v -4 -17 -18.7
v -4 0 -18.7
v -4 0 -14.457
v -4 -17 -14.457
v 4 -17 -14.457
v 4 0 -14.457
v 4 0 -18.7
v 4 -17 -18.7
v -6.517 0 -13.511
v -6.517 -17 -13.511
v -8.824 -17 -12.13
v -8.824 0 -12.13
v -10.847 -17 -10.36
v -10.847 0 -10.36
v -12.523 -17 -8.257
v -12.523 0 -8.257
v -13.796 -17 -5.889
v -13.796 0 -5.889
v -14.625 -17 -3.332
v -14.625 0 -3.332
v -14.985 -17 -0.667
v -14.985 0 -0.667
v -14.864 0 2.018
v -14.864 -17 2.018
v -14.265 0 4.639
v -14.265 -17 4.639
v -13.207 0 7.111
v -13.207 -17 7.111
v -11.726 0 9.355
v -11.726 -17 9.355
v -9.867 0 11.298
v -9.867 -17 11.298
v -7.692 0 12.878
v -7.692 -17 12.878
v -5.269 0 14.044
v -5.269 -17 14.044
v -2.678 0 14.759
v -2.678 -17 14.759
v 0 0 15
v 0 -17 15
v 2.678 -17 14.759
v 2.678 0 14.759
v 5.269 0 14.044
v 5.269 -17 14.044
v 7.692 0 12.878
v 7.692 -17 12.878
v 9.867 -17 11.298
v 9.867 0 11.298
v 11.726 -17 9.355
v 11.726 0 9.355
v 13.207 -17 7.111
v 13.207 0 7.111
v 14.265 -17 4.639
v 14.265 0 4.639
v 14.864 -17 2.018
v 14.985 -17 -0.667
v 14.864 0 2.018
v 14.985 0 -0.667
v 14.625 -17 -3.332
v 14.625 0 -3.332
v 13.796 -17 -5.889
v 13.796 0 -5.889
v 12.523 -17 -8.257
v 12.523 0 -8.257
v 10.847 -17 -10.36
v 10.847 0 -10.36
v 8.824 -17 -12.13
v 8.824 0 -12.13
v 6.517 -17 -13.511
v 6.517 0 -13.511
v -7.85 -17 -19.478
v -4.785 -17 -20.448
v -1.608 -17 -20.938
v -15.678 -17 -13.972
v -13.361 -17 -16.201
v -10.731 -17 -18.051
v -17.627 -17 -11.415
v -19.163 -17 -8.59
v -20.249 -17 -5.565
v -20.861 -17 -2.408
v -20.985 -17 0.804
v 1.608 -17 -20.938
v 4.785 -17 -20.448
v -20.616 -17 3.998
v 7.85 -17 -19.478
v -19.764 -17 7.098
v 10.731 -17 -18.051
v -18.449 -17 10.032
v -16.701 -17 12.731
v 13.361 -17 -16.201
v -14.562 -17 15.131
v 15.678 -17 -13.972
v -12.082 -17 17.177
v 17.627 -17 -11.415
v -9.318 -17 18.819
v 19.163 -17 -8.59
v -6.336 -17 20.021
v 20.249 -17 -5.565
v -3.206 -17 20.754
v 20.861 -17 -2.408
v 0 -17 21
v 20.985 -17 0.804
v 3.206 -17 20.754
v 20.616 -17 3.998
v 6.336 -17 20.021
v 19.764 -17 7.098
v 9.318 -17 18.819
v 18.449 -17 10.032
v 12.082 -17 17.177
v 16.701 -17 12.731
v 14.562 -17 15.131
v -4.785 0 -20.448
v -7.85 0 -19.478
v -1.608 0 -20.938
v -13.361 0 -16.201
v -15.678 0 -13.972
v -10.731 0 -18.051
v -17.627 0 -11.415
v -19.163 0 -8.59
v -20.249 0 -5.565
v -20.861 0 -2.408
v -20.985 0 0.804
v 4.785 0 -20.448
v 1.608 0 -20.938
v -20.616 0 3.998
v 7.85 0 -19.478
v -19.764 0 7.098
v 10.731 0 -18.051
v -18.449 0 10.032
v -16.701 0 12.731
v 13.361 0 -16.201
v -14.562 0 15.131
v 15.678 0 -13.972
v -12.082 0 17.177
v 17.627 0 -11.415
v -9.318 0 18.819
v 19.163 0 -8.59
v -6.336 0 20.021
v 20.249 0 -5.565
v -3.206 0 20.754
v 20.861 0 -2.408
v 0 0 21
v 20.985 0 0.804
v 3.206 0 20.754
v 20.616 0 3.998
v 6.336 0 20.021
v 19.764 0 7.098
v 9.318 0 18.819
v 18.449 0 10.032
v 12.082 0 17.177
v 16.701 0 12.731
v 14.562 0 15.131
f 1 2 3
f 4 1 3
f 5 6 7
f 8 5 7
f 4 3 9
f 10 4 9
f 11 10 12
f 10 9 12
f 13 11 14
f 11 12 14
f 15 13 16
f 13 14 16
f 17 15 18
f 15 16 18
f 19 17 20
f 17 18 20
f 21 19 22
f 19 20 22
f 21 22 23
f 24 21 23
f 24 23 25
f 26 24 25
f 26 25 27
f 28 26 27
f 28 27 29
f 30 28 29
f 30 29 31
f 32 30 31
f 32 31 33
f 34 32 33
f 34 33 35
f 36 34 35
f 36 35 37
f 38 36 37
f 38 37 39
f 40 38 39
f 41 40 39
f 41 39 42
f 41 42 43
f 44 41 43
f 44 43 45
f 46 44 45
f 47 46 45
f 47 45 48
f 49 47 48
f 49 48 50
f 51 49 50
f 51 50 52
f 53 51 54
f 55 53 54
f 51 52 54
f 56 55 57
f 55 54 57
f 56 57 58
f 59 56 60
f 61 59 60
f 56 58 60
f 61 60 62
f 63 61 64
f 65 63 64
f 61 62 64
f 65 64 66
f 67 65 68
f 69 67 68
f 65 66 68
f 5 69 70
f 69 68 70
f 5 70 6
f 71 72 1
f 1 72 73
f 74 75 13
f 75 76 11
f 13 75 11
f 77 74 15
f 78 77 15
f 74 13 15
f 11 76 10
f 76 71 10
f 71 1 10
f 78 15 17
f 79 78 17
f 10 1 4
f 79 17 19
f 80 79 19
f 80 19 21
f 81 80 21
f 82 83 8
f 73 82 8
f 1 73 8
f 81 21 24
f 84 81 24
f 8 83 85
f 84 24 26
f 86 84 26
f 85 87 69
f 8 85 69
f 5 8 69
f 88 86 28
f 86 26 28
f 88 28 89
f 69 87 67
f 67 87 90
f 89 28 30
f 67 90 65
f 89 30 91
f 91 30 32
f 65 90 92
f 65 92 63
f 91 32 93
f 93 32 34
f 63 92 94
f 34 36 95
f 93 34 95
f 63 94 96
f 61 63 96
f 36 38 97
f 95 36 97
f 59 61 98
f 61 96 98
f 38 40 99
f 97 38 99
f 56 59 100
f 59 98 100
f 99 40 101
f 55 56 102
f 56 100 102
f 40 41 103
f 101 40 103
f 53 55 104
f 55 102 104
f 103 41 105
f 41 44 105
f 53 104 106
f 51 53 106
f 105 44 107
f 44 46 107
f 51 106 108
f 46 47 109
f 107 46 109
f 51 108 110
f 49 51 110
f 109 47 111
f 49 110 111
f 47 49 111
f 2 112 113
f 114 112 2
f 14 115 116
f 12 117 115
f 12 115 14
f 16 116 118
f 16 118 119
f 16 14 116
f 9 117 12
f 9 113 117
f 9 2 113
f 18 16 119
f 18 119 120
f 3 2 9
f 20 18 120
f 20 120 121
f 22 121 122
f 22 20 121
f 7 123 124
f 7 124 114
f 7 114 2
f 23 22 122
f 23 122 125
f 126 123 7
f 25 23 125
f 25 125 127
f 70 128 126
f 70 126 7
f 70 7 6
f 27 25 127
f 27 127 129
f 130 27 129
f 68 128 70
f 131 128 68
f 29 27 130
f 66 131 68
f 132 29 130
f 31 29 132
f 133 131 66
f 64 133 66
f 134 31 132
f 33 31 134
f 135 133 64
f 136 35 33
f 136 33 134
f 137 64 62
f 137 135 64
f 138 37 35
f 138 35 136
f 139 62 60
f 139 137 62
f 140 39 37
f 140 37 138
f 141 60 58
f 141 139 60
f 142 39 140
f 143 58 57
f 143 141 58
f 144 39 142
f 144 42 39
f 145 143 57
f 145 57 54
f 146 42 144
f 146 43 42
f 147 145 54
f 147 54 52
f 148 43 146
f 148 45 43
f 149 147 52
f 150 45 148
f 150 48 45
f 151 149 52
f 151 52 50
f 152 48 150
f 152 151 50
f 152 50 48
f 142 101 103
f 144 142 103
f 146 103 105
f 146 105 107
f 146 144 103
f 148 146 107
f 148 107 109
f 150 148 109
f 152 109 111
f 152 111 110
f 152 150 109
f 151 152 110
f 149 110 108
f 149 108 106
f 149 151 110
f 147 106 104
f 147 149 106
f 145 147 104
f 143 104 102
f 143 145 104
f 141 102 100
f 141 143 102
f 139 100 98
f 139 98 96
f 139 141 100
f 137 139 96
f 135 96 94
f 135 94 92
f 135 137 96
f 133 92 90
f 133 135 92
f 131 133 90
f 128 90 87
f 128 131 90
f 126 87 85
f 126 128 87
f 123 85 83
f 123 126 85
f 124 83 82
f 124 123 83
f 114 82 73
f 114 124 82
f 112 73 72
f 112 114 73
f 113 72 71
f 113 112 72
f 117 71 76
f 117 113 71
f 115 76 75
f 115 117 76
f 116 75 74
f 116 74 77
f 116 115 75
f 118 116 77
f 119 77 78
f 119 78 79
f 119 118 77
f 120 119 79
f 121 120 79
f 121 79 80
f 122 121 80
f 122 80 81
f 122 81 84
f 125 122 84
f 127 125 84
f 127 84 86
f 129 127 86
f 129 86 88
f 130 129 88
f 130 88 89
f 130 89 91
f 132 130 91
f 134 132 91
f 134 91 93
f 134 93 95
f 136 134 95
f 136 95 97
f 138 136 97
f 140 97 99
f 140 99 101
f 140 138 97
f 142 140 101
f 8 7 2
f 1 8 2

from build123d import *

# Parameters (mm, degrees)
SKETCH1_R           = 21
SKETCH1_R_2         = 15
BOSS_EXTRUDE1_DEPTH = 17
CUT_EXTRUDE1_DEPTH  = 35.219877265


with BuildPart() as part:
    # Sketch1 → Boss-Extrude1 (new body)
    with BuildSketch(Plane(origin=(0, 0, 0), x_dir=(1, 0, 0), z_dir=(0, 1, 0))):
        with Locations(Location((0, 0, 0), (0, 0, 270))):
            Circle(SKETCH1_R)
        with Locations(Location((0, 0, 0), (0, 0, 270))):
            Circle(SKETCH1_R_2, mode=Mode.SUBTRACT)
    extrude(amount=-BOSS_EXTRUDE1_DEPTH)

    # Sketch2 → Cut-Extrude1 (cut, through all)
    with BuildSketch(Plane(origin=(0, 0, 0), x_dir=(1, 0, 0), z_dir=(0, 1, 0))):
        with BuildLine():
            Line((4, 18.7), (-4, 18.7))
            Line((-4, 18.7), (-4, 14.456832295))
            ThreePointArc((-4, 14.456832295), (0, 15), (4, 14.456832295))
            Line((4, 14.456832295), (4, 18.7))
        make_face()
    extrude(amount=-CUT_EXTRUDE1_DEPTH, mode=Mode.SUBTRACT)


solid = part.part
